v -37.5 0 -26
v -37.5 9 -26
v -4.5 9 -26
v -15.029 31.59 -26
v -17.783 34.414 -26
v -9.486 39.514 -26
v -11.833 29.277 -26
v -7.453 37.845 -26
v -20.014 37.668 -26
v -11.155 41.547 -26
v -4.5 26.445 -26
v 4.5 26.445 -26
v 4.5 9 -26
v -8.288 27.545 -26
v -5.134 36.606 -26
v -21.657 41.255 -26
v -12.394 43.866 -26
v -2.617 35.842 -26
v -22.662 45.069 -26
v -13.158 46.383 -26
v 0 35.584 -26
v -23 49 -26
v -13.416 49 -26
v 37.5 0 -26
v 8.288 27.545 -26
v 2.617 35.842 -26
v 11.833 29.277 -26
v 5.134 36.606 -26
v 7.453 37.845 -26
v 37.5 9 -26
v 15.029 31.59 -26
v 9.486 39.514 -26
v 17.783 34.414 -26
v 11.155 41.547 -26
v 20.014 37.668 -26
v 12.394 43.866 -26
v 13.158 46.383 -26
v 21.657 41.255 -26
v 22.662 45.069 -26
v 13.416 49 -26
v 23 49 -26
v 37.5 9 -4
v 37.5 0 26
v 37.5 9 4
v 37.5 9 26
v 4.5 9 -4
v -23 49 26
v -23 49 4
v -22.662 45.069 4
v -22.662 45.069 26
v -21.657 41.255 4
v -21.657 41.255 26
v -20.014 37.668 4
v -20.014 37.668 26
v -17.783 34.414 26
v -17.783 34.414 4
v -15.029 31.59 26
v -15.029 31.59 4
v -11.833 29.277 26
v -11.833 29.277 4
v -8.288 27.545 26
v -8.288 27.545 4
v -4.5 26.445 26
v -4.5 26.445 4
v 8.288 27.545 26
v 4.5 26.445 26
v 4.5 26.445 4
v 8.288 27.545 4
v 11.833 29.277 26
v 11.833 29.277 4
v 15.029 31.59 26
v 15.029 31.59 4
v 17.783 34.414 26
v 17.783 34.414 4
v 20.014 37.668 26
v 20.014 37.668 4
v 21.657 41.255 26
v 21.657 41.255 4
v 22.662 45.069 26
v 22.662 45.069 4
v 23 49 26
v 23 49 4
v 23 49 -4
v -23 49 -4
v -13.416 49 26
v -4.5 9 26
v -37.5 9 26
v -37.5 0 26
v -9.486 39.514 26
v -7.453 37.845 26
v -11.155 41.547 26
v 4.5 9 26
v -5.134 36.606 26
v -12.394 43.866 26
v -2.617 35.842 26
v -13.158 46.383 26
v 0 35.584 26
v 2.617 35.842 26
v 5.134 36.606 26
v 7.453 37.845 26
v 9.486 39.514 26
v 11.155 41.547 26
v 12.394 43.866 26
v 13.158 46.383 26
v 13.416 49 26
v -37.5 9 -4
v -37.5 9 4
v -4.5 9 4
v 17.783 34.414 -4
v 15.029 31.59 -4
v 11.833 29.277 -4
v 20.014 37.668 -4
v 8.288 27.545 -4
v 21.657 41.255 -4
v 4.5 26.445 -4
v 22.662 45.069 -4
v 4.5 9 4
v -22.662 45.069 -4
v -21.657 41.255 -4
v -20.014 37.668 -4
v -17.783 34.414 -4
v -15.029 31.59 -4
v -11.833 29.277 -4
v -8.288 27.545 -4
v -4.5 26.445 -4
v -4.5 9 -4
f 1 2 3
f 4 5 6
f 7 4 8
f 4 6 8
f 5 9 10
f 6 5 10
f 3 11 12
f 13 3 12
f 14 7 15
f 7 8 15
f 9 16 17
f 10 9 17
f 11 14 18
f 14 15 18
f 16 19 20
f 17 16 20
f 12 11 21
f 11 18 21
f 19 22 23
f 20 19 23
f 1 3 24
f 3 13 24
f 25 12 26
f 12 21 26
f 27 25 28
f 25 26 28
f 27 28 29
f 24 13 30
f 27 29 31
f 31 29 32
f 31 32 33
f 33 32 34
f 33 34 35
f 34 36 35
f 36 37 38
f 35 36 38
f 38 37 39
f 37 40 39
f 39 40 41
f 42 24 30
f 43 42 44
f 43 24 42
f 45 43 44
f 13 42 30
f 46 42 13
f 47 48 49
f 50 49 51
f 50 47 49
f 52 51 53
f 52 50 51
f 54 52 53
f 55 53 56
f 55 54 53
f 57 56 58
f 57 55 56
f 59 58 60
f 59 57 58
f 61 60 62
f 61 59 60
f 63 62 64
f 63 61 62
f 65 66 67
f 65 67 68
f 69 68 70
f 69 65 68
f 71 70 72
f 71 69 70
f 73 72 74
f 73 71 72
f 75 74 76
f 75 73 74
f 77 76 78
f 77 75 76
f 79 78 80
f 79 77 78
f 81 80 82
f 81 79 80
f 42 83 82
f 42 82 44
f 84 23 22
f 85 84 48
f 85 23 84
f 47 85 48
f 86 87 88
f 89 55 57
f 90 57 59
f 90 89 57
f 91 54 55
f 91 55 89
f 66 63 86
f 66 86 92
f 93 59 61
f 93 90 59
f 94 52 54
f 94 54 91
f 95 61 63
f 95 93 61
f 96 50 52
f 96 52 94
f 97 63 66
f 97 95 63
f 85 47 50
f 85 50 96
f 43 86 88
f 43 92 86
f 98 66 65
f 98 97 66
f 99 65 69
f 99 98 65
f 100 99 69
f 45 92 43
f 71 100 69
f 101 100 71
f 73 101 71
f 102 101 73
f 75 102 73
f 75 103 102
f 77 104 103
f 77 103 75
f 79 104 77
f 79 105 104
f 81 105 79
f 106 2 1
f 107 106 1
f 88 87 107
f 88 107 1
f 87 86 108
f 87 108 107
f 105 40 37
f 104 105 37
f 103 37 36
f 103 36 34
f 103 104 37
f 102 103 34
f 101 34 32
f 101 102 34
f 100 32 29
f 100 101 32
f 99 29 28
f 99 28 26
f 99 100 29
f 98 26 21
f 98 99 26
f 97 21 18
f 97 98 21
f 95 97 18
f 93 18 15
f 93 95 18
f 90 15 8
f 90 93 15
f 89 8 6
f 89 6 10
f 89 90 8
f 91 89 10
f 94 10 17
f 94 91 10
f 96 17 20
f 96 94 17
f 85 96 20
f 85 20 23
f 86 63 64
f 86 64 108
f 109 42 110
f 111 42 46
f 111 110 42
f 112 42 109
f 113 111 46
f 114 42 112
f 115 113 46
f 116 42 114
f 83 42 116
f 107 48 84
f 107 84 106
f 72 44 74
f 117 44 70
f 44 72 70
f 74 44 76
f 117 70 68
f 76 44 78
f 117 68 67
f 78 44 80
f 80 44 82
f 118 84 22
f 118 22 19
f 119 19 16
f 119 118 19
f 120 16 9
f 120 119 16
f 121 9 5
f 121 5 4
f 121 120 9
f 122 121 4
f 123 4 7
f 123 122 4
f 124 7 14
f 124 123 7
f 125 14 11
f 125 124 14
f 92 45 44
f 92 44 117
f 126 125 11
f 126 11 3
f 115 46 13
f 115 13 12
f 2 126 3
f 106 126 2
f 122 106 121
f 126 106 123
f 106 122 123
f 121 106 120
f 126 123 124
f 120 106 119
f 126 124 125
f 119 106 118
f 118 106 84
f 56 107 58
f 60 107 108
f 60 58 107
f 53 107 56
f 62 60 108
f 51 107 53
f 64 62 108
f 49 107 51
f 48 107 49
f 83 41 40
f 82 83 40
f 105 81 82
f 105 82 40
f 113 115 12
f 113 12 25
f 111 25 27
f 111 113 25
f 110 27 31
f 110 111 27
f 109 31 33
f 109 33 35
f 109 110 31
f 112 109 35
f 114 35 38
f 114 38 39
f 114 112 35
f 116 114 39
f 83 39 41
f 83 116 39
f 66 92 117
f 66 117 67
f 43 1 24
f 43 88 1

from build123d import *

# Parameters (mm, degrees)
BOSS_EXTRUDE1_DEPTH = 26
BOSS_EXTRUDE2_DEPTH = 4


with BuildPart() as part:
    # Sketch1 → Boss-Extrude1 (new, symmetric)
    with BuildSketch(Plane.XY):
        with BuildLine():
            Line((-37.5, 9), (-37.5, 0))
            Line((-37.5, 0), (37.5, 0))
            Line((37.5, 0), (37.5, 9))
            Line((37.5, 9), (4.5, 9))
            Line((4.5, 9), (4.5, 26.444512863))
            ThreePointArc((4.5, 26.444512863), (17.783419244, 34.414047854), (23, 49))
            Line((23, 49), (13.415512749, 49))
            ThreePointArc((13.415512749, 49), (0, 35.584487251), (-13.415512749, 49))
            Line((-13.415512749, 49), (-23, 49))
            ThreePointArc((-23, 49), (-17.783419244, 34.414047854), (-4.5, 26.444512863))
            Line((-4.5, 26.444512863), (-4.5, 9))
            Line((-4.5, 9), (-37.5, 9))
        make_face()
    extrude(amount=BOSS_EXTRUDE1_DEPTH, both=True)

    # Sketch1<3> → Boss-Extrude2 (add, symmetric)
    with BuildSketch(Plane.XY):
        with BuildLine():
            Line((-23, 49), (-37.5, 9))
            Line((-37.5, 9), (-4.5, 9))
            Line((-4.5, 9), (-4.5, 26.444512863))
            ThreePointArc((-4.5, 26.444512863), (-17.783419244, 34.414047854), (-23, 49))
        make_face()
        with BuildLine():
            Line((4.5, 9), (37.5, 9))
            Line((37.5, 9), (23, 49))
            ThreePointArc((23, 49), (17.783419244, 34.414047854), (4.5, 26.444512863))
            Line((4.5, 26.444512863), (4.5, 9))
        make_face()
    extrude(amount=BOSS_EXTRUDE2_DEPTH, both=True)


solid = part.part
